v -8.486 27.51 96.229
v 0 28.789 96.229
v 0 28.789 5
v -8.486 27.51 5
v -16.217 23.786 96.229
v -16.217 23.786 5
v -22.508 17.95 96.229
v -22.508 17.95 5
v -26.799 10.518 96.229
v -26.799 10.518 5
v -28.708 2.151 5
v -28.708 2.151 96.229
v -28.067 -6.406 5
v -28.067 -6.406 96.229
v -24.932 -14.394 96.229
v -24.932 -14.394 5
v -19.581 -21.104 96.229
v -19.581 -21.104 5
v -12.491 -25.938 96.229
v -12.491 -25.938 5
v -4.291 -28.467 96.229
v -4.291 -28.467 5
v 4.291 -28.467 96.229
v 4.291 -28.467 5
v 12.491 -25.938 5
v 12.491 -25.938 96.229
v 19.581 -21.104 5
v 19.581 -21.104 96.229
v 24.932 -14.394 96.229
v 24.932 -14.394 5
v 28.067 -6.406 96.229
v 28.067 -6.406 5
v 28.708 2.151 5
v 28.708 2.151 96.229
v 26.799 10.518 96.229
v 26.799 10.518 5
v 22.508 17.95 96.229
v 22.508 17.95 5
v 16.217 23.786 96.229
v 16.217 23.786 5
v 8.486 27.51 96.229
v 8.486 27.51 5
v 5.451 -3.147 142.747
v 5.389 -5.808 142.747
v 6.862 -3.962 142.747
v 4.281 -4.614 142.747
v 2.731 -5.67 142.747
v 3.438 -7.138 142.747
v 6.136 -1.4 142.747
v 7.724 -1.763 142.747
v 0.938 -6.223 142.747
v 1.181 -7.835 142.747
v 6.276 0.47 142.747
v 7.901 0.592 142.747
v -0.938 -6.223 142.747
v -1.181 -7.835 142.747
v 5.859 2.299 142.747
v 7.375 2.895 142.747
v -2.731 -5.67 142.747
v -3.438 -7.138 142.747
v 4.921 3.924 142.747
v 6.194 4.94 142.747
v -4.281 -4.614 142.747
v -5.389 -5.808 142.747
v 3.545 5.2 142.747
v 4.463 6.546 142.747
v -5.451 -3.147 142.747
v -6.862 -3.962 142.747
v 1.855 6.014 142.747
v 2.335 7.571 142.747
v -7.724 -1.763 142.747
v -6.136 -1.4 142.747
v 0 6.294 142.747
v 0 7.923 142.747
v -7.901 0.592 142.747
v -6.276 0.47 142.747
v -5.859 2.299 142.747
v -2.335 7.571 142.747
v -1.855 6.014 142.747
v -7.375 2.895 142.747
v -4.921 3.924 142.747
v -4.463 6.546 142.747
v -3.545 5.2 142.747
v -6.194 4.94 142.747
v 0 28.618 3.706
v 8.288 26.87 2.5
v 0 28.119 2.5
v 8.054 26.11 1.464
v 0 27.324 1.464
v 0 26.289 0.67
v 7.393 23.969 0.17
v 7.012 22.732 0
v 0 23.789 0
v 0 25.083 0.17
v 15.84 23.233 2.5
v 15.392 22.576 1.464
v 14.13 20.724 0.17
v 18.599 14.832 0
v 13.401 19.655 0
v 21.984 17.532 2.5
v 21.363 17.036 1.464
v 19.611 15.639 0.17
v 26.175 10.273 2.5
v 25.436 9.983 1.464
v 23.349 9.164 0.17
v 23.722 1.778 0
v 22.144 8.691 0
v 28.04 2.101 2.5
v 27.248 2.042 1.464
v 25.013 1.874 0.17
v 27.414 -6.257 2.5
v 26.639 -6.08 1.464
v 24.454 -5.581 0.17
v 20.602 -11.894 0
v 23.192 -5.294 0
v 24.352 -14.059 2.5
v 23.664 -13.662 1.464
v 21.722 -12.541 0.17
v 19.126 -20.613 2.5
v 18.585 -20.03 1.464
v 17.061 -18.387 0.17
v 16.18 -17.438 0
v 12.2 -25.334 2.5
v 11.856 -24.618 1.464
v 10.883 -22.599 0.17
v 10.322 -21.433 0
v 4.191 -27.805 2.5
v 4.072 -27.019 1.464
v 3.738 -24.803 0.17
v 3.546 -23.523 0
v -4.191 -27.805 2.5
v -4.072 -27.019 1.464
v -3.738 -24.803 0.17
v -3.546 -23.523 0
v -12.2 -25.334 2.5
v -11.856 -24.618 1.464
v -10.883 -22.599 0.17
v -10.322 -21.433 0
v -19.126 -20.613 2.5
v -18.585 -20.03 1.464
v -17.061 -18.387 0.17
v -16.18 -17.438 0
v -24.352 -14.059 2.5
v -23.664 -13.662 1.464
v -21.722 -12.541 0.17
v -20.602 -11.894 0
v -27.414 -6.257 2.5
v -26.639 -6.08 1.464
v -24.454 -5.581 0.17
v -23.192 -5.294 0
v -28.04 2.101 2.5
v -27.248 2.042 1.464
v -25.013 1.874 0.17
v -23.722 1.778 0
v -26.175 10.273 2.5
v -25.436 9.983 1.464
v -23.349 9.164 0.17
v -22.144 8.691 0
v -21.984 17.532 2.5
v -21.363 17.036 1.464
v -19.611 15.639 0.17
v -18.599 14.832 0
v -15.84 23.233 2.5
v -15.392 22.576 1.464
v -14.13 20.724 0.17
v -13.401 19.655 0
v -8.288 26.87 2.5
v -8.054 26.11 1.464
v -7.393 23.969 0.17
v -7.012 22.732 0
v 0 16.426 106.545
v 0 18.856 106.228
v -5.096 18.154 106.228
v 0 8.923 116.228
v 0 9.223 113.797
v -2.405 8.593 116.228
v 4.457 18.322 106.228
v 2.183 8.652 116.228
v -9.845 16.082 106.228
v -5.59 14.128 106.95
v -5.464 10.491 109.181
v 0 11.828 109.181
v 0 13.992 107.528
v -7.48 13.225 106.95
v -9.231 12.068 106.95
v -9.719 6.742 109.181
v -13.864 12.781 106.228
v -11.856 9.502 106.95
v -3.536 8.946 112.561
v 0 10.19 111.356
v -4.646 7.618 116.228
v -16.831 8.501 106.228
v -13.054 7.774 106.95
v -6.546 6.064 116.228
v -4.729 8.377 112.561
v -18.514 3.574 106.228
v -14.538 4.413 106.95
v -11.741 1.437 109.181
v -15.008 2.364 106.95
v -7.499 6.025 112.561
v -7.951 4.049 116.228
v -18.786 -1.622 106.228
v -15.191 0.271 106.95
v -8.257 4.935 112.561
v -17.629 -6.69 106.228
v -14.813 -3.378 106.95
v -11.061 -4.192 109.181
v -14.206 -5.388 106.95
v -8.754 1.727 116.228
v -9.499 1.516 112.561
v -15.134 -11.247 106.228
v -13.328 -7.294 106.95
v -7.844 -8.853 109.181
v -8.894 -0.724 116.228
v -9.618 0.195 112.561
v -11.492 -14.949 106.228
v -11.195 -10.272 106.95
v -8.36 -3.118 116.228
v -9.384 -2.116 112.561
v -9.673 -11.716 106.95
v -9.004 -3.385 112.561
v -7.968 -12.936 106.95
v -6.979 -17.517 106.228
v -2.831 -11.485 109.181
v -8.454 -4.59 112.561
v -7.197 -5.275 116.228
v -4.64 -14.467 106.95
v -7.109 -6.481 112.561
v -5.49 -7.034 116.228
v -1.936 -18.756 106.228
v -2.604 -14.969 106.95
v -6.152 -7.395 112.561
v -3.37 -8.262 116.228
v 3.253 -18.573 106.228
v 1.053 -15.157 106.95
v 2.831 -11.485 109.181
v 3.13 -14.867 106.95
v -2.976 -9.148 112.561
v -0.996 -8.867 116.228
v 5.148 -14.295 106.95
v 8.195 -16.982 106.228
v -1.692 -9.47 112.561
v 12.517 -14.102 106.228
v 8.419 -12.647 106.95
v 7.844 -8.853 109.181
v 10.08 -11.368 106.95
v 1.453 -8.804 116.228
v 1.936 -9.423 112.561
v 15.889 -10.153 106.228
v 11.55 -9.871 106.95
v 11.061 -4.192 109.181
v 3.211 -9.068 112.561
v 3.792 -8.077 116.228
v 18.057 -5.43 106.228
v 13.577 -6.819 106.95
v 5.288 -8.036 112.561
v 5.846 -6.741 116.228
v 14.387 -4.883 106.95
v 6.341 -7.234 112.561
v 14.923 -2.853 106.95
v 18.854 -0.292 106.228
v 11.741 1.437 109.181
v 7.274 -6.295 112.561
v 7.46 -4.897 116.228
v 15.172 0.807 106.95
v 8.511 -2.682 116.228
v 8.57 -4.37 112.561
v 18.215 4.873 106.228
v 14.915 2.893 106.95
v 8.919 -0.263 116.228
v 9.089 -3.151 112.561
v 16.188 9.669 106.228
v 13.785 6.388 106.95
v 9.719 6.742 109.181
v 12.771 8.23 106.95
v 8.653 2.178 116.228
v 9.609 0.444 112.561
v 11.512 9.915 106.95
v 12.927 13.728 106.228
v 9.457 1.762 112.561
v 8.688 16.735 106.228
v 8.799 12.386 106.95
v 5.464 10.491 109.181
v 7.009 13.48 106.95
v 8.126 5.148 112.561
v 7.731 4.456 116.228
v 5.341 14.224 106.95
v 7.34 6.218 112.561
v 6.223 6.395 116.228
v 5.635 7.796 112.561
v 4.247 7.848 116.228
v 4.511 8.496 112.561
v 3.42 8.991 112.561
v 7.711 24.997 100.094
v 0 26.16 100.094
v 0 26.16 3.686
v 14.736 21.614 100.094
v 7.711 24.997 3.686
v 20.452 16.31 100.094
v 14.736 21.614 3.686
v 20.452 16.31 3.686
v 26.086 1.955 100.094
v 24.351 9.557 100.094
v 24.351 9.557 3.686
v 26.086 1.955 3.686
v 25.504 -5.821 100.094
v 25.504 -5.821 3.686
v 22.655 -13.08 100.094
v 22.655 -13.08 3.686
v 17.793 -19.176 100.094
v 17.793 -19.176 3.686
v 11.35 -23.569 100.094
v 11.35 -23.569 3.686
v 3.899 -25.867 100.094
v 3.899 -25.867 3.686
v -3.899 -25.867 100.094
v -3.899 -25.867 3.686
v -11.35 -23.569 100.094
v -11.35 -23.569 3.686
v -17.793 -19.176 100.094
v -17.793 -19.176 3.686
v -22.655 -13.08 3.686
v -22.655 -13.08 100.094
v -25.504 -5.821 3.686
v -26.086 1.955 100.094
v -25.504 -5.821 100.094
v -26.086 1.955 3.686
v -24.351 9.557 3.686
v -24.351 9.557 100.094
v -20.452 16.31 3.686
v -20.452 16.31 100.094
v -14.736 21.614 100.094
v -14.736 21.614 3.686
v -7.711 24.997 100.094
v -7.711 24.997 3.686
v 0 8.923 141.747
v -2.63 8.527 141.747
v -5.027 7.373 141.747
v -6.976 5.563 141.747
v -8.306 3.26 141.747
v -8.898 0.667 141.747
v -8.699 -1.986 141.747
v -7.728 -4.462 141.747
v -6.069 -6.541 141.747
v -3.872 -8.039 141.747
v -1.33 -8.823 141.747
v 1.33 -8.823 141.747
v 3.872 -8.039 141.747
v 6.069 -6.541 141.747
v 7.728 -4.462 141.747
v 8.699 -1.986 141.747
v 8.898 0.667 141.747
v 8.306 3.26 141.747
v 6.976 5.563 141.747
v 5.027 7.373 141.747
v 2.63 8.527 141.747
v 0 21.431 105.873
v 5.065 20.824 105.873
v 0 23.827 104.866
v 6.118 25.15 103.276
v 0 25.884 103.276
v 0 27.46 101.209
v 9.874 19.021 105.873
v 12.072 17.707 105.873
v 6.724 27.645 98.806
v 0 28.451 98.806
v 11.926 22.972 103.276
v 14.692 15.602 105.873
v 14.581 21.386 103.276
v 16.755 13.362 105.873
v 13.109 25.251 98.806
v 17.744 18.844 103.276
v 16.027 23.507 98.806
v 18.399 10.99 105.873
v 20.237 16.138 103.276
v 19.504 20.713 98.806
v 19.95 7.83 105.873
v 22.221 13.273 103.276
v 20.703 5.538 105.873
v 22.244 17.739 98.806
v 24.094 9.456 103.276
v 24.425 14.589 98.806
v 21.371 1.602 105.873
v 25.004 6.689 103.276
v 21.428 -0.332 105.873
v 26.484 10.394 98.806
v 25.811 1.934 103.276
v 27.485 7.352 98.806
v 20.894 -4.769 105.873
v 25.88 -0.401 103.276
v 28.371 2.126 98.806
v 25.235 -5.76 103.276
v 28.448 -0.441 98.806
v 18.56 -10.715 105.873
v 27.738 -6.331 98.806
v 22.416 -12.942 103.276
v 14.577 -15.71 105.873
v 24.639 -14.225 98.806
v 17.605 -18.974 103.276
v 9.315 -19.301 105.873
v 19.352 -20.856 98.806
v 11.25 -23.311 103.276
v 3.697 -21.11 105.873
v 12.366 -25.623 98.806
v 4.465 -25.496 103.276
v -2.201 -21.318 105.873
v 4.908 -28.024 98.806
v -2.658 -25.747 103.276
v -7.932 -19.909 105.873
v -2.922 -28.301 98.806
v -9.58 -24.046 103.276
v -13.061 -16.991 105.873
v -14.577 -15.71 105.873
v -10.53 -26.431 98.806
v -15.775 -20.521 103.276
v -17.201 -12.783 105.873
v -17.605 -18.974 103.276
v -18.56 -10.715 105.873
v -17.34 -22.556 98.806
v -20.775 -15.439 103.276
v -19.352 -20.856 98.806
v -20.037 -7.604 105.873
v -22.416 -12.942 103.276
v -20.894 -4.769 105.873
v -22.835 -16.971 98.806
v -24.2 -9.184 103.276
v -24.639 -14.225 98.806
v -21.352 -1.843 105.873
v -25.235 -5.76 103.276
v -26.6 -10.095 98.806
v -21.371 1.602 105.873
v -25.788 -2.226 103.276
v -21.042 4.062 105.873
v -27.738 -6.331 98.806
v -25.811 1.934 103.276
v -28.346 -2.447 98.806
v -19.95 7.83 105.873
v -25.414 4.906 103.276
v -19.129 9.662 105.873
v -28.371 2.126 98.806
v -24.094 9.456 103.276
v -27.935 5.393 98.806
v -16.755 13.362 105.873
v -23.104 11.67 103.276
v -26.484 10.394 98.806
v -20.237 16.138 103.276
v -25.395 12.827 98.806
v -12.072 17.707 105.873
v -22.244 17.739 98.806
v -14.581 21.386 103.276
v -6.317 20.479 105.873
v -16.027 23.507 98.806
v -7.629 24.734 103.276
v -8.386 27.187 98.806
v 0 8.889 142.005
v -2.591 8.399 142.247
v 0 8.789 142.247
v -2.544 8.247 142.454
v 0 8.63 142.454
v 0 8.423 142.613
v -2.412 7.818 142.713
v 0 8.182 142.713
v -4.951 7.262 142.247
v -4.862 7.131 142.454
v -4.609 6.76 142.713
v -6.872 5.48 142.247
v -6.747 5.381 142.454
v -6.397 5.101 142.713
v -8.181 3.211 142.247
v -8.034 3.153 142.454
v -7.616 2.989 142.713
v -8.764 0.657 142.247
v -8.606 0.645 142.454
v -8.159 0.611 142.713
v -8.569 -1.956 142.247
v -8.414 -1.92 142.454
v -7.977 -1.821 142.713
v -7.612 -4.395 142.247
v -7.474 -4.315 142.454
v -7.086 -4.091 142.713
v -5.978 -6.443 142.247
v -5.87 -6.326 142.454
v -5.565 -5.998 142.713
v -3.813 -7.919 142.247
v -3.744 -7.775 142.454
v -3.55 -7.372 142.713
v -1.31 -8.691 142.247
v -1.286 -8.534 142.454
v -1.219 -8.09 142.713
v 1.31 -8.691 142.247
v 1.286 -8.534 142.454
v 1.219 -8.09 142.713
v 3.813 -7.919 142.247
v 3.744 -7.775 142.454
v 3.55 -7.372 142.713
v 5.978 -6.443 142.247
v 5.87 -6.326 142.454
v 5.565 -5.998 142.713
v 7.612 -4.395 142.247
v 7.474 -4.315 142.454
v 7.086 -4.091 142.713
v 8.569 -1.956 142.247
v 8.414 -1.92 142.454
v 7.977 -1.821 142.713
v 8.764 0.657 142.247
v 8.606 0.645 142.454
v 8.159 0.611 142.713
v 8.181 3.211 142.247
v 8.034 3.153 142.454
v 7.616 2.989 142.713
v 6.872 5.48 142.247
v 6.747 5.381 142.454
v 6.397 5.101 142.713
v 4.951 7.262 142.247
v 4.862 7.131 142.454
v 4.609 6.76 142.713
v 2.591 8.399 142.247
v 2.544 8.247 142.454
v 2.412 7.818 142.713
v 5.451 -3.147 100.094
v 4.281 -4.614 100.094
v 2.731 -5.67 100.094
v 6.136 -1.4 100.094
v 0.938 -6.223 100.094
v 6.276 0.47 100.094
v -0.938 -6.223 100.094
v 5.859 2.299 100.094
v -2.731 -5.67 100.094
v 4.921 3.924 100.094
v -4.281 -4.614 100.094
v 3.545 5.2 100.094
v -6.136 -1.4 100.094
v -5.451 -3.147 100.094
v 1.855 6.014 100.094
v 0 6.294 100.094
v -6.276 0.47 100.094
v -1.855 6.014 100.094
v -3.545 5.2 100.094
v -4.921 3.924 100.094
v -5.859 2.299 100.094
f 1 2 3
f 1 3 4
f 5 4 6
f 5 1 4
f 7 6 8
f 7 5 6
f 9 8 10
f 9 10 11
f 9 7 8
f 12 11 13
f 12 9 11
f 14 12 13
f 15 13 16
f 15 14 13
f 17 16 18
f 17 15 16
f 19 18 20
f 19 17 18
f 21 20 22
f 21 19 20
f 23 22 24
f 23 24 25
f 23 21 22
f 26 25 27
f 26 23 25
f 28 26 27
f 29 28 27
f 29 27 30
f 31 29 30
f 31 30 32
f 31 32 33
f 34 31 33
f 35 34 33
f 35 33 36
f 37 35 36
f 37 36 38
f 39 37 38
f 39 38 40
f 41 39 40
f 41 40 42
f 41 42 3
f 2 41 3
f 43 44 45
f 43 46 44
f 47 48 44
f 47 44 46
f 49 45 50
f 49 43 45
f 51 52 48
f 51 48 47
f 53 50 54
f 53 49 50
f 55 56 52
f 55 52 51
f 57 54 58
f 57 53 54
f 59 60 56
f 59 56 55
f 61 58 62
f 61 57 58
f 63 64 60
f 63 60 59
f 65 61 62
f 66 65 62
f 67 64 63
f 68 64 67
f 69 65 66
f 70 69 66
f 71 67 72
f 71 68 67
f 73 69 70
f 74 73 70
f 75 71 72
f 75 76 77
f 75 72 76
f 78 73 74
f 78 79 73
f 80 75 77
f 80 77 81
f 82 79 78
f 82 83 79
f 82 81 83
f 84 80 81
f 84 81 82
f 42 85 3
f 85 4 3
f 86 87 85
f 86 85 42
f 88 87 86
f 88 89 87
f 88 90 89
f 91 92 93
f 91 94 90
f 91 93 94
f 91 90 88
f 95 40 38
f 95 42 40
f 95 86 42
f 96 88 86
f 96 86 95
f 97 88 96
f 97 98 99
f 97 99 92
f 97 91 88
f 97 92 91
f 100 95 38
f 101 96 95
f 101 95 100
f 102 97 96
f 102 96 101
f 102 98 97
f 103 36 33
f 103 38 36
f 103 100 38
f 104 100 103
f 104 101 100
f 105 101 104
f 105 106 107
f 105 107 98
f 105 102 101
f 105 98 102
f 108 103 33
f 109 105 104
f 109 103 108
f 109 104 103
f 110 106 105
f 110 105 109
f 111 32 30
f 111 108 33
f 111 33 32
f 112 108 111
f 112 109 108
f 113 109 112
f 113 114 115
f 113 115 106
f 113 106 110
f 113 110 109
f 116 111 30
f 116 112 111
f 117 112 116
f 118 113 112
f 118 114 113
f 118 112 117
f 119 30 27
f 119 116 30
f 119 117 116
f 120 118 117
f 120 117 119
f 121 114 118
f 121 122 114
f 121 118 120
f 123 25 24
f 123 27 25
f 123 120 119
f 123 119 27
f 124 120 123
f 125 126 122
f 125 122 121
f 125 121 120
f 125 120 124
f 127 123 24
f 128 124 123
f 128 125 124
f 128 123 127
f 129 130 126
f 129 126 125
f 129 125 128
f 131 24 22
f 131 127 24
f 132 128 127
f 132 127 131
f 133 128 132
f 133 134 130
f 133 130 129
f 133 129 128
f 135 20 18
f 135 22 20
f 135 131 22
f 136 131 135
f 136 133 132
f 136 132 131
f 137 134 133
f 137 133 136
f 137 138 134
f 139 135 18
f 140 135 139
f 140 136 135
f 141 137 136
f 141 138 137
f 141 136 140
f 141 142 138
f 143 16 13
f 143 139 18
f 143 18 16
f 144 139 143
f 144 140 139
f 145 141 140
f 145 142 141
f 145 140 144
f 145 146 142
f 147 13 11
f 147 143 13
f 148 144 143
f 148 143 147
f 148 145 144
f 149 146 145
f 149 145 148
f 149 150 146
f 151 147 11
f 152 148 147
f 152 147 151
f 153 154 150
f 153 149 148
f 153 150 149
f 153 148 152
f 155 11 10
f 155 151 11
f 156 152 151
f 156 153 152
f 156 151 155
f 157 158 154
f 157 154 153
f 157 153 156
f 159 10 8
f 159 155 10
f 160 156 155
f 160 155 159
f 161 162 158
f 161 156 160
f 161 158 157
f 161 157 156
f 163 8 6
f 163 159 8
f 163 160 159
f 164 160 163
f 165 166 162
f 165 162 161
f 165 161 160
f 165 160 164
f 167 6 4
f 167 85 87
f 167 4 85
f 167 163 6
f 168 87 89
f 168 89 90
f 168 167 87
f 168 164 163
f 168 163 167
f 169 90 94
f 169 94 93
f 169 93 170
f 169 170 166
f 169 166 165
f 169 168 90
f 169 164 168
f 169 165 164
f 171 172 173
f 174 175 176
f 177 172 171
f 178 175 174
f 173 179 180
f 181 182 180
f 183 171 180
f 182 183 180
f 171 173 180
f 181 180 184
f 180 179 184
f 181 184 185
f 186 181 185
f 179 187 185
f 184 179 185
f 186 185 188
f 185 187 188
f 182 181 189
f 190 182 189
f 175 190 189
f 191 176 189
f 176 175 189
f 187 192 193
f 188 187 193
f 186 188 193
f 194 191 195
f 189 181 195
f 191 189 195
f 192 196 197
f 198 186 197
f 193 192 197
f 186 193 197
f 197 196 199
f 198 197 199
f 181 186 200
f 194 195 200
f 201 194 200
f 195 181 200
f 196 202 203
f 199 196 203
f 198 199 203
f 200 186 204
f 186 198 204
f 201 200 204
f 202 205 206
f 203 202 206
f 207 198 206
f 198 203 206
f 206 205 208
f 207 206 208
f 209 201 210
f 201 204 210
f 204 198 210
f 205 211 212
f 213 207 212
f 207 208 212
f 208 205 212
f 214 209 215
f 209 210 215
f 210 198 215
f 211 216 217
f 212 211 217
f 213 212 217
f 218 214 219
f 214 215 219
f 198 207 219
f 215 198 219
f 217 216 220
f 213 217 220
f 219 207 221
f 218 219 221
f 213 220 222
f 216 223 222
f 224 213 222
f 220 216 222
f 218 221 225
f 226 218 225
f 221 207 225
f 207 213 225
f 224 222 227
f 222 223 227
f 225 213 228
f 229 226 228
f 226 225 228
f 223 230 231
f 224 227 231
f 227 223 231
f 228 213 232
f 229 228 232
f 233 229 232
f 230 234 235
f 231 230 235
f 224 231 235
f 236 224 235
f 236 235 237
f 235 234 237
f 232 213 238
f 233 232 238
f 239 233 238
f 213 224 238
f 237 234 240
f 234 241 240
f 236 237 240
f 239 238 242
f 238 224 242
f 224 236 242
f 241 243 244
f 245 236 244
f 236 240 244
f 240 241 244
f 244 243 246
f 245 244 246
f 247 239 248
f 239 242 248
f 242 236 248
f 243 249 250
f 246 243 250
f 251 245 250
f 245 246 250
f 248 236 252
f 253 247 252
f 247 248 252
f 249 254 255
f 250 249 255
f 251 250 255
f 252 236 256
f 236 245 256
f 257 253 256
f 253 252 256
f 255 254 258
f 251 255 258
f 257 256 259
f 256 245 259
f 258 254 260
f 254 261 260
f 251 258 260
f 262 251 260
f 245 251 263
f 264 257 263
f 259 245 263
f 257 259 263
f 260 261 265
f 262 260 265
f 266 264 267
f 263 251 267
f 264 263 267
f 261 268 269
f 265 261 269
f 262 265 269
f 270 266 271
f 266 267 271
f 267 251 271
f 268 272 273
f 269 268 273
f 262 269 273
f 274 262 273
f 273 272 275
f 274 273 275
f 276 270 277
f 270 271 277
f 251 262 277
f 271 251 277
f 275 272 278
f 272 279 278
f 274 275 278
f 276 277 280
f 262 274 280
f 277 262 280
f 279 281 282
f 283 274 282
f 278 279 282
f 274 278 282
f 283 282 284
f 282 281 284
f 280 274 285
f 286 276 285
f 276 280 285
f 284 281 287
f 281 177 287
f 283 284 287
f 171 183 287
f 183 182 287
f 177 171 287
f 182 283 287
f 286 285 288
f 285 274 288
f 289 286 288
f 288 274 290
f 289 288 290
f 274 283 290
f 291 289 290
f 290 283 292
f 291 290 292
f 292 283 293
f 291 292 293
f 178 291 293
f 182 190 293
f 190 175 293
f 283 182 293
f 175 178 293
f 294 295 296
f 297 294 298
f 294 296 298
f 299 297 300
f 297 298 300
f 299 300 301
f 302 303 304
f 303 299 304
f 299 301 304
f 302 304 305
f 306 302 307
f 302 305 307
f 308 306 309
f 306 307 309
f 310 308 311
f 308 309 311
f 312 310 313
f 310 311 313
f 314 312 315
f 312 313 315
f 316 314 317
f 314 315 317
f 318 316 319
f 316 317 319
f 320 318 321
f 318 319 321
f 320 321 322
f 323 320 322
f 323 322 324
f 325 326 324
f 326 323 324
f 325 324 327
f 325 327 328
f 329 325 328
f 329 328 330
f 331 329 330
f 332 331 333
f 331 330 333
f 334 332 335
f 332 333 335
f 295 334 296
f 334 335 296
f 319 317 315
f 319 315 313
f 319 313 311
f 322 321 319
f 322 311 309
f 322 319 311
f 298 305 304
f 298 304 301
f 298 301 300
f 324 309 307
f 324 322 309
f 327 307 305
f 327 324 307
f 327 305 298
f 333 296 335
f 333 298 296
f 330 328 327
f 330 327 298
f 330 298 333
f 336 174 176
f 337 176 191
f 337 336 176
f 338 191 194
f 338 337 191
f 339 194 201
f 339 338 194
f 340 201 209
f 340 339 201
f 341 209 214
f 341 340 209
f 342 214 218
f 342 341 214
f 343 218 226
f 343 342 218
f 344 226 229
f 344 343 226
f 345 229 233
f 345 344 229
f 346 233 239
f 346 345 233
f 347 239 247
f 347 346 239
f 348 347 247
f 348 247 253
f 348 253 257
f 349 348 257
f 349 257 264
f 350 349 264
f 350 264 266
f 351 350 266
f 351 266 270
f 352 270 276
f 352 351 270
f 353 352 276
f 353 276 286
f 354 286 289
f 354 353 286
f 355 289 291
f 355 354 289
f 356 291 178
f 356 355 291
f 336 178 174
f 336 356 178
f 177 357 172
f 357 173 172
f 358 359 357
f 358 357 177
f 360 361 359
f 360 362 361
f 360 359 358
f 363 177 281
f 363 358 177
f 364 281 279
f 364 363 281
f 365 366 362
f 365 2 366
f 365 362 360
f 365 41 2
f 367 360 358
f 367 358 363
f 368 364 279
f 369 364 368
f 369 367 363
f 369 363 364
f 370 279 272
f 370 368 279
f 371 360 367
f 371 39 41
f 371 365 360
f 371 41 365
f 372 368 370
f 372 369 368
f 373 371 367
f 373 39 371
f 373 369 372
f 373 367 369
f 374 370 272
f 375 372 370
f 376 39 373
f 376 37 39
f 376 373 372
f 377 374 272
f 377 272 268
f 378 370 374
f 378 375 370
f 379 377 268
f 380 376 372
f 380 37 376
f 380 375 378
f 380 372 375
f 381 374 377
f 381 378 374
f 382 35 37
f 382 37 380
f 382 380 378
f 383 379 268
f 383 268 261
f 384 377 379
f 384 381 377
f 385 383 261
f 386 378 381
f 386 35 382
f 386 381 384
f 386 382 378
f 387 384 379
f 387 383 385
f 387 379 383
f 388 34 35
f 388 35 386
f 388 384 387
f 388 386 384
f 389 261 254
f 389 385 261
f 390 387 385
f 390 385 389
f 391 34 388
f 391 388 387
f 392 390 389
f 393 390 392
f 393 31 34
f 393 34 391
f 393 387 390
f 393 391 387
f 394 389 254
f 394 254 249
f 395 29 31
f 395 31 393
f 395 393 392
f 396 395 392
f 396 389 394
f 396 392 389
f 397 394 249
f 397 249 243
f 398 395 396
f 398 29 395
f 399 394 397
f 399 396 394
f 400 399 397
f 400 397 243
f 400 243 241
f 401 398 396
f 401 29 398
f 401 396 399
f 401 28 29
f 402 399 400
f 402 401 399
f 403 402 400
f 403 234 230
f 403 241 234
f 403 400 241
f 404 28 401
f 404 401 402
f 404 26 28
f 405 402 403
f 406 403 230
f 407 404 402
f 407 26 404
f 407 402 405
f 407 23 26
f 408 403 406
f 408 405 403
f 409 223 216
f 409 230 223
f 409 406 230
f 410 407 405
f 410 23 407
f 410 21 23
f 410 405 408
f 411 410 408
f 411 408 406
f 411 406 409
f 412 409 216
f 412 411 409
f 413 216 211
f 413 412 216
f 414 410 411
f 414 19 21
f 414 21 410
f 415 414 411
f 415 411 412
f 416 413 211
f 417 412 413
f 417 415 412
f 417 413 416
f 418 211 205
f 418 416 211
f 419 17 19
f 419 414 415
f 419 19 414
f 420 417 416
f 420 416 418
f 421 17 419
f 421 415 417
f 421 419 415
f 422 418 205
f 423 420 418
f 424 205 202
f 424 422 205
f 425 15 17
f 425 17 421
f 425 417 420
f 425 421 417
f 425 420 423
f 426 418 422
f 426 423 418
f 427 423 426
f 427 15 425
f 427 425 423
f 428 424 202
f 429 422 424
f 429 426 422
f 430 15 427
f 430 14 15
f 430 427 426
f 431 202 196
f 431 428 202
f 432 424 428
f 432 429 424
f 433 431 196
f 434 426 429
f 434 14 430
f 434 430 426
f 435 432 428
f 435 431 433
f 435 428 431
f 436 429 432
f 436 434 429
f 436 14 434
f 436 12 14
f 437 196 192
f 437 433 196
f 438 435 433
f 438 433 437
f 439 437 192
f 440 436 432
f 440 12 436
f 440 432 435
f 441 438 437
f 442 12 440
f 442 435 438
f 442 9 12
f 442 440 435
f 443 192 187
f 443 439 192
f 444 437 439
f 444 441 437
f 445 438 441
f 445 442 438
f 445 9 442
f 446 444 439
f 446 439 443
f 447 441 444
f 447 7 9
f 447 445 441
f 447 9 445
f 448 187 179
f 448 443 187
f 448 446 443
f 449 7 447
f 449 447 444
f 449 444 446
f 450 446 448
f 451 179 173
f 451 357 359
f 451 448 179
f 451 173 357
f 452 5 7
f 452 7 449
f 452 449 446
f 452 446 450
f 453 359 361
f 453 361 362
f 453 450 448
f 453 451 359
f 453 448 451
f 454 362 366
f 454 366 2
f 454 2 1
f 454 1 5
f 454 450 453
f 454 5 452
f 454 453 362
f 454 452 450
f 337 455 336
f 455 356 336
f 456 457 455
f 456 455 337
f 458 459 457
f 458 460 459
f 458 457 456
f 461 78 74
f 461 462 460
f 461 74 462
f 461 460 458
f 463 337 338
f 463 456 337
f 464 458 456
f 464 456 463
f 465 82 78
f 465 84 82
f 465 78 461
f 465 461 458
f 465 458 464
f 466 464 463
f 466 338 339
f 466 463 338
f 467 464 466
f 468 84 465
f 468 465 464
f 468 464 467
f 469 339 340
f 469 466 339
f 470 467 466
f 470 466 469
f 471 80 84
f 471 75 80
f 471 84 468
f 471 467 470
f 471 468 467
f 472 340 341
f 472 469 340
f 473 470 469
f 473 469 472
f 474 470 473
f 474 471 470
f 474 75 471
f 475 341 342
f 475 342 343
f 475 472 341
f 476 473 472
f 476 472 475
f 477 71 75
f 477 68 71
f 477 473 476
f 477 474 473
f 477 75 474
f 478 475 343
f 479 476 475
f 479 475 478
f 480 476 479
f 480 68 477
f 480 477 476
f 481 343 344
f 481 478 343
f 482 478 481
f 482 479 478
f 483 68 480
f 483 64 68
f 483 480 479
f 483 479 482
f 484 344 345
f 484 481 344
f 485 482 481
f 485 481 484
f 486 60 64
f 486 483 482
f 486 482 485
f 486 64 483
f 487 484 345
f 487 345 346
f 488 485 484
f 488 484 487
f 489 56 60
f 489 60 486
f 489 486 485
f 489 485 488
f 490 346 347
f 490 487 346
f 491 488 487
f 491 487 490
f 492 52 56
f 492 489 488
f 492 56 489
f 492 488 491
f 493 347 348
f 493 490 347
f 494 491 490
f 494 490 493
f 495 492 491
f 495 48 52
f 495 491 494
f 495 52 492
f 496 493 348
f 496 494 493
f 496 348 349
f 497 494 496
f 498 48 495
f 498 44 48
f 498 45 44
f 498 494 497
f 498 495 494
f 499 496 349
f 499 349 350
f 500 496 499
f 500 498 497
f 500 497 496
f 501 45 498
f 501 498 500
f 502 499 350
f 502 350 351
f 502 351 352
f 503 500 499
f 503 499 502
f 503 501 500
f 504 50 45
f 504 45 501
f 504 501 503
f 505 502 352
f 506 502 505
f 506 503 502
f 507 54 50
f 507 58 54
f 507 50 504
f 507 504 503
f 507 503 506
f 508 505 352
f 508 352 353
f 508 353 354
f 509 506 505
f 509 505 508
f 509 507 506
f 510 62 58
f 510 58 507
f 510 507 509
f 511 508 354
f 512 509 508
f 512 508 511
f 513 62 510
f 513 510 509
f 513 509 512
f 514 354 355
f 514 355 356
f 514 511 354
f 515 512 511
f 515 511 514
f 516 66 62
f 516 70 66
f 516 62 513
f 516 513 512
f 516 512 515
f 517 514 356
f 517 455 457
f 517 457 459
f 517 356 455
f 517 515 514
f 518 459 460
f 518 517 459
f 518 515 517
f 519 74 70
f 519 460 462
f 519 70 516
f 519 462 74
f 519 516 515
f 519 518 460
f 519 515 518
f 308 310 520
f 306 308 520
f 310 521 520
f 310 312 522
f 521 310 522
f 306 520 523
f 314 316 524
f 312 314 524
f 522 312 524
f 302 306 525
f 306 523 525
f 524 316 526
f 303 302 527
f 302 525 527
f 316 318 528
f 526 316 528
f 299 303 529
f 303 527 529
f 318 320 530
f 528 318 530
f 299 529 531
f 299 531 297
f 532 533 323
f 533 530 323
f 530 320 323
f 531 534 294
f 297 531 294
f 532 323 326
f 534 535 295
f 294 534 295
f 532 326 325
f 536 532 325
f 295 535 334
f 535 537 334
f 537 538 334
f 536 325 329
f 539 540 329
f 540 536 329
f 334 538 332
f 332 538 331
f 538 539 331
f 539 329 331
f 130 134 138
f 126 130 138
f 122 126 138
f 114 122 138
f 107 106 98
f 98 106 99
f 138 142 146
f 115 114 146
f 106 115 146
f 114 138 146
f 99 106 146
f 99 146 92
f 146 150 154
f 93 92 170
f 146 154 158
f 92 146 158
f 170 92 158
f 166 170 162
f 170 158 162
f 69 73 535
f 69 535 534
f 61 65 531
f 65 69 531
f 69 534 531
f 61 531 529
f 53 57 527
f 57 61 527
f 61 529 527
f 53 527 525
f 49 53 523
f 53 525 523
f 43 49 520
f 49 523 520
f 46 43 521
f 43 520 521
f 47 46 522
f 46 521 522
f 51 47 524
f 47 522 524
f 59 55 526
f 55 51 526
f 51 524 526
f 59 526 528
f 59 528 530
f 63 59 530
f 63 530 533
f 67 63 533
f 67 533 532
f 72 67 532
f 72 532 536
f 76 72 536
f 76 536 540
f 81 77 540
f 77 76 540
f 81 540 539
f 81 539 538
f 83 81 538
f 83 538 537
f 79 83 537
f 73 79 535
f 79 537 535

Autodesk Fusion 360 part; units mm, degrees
sketch "Sketch3" plane through (0, 0, 0) normal (1, 0, 0) x (0, 1, 0)
  line L0 (0, 0) -> (28.7888, 0)
  line L1 (28.7888, 0) -> (28.7888, 106.2286)
  line L2 (28.7888, 106.2286) -> (8.923, 106.2286)
  line L3 (8.923, 106.2286) -> (8.923, 142.7466)
  line L4 (6.2937, 142.7466) -> (6.2937, 100.0936)
  line L5 (6.2937, 100.0936) -> (26.1595, 100.0936)
  line L6 (26.1595, 100.0936) -> (26.1595, 3.6859)
  line L7 (26.1595, 3.6859) -> (0, 3.6859)
  line L8 (0, 3.6859) -> (0, 0)
  line L9 (8.923, 142.7466) -> (6.2937, 142.7466)
revolve "Revolve2" add sketch "Sketch3" angle 360 about axis through (0, 0, 1.75) along (0, 0, 1)
fillet "Fillet10" radius 10 1 edges at (-26.8406, 10.4105, 106.2286)
fillet "Fillet11" radius 10 1 edges at (-8.3191, 3.2267, 106.2286)
fillet "Fillet12" radius 1 1 edges at (-8.3191, 3.2267, 142.7466)
fillet "Fillet13" radius 5 1 edges at (-26.8406, 10.4105, 0)
